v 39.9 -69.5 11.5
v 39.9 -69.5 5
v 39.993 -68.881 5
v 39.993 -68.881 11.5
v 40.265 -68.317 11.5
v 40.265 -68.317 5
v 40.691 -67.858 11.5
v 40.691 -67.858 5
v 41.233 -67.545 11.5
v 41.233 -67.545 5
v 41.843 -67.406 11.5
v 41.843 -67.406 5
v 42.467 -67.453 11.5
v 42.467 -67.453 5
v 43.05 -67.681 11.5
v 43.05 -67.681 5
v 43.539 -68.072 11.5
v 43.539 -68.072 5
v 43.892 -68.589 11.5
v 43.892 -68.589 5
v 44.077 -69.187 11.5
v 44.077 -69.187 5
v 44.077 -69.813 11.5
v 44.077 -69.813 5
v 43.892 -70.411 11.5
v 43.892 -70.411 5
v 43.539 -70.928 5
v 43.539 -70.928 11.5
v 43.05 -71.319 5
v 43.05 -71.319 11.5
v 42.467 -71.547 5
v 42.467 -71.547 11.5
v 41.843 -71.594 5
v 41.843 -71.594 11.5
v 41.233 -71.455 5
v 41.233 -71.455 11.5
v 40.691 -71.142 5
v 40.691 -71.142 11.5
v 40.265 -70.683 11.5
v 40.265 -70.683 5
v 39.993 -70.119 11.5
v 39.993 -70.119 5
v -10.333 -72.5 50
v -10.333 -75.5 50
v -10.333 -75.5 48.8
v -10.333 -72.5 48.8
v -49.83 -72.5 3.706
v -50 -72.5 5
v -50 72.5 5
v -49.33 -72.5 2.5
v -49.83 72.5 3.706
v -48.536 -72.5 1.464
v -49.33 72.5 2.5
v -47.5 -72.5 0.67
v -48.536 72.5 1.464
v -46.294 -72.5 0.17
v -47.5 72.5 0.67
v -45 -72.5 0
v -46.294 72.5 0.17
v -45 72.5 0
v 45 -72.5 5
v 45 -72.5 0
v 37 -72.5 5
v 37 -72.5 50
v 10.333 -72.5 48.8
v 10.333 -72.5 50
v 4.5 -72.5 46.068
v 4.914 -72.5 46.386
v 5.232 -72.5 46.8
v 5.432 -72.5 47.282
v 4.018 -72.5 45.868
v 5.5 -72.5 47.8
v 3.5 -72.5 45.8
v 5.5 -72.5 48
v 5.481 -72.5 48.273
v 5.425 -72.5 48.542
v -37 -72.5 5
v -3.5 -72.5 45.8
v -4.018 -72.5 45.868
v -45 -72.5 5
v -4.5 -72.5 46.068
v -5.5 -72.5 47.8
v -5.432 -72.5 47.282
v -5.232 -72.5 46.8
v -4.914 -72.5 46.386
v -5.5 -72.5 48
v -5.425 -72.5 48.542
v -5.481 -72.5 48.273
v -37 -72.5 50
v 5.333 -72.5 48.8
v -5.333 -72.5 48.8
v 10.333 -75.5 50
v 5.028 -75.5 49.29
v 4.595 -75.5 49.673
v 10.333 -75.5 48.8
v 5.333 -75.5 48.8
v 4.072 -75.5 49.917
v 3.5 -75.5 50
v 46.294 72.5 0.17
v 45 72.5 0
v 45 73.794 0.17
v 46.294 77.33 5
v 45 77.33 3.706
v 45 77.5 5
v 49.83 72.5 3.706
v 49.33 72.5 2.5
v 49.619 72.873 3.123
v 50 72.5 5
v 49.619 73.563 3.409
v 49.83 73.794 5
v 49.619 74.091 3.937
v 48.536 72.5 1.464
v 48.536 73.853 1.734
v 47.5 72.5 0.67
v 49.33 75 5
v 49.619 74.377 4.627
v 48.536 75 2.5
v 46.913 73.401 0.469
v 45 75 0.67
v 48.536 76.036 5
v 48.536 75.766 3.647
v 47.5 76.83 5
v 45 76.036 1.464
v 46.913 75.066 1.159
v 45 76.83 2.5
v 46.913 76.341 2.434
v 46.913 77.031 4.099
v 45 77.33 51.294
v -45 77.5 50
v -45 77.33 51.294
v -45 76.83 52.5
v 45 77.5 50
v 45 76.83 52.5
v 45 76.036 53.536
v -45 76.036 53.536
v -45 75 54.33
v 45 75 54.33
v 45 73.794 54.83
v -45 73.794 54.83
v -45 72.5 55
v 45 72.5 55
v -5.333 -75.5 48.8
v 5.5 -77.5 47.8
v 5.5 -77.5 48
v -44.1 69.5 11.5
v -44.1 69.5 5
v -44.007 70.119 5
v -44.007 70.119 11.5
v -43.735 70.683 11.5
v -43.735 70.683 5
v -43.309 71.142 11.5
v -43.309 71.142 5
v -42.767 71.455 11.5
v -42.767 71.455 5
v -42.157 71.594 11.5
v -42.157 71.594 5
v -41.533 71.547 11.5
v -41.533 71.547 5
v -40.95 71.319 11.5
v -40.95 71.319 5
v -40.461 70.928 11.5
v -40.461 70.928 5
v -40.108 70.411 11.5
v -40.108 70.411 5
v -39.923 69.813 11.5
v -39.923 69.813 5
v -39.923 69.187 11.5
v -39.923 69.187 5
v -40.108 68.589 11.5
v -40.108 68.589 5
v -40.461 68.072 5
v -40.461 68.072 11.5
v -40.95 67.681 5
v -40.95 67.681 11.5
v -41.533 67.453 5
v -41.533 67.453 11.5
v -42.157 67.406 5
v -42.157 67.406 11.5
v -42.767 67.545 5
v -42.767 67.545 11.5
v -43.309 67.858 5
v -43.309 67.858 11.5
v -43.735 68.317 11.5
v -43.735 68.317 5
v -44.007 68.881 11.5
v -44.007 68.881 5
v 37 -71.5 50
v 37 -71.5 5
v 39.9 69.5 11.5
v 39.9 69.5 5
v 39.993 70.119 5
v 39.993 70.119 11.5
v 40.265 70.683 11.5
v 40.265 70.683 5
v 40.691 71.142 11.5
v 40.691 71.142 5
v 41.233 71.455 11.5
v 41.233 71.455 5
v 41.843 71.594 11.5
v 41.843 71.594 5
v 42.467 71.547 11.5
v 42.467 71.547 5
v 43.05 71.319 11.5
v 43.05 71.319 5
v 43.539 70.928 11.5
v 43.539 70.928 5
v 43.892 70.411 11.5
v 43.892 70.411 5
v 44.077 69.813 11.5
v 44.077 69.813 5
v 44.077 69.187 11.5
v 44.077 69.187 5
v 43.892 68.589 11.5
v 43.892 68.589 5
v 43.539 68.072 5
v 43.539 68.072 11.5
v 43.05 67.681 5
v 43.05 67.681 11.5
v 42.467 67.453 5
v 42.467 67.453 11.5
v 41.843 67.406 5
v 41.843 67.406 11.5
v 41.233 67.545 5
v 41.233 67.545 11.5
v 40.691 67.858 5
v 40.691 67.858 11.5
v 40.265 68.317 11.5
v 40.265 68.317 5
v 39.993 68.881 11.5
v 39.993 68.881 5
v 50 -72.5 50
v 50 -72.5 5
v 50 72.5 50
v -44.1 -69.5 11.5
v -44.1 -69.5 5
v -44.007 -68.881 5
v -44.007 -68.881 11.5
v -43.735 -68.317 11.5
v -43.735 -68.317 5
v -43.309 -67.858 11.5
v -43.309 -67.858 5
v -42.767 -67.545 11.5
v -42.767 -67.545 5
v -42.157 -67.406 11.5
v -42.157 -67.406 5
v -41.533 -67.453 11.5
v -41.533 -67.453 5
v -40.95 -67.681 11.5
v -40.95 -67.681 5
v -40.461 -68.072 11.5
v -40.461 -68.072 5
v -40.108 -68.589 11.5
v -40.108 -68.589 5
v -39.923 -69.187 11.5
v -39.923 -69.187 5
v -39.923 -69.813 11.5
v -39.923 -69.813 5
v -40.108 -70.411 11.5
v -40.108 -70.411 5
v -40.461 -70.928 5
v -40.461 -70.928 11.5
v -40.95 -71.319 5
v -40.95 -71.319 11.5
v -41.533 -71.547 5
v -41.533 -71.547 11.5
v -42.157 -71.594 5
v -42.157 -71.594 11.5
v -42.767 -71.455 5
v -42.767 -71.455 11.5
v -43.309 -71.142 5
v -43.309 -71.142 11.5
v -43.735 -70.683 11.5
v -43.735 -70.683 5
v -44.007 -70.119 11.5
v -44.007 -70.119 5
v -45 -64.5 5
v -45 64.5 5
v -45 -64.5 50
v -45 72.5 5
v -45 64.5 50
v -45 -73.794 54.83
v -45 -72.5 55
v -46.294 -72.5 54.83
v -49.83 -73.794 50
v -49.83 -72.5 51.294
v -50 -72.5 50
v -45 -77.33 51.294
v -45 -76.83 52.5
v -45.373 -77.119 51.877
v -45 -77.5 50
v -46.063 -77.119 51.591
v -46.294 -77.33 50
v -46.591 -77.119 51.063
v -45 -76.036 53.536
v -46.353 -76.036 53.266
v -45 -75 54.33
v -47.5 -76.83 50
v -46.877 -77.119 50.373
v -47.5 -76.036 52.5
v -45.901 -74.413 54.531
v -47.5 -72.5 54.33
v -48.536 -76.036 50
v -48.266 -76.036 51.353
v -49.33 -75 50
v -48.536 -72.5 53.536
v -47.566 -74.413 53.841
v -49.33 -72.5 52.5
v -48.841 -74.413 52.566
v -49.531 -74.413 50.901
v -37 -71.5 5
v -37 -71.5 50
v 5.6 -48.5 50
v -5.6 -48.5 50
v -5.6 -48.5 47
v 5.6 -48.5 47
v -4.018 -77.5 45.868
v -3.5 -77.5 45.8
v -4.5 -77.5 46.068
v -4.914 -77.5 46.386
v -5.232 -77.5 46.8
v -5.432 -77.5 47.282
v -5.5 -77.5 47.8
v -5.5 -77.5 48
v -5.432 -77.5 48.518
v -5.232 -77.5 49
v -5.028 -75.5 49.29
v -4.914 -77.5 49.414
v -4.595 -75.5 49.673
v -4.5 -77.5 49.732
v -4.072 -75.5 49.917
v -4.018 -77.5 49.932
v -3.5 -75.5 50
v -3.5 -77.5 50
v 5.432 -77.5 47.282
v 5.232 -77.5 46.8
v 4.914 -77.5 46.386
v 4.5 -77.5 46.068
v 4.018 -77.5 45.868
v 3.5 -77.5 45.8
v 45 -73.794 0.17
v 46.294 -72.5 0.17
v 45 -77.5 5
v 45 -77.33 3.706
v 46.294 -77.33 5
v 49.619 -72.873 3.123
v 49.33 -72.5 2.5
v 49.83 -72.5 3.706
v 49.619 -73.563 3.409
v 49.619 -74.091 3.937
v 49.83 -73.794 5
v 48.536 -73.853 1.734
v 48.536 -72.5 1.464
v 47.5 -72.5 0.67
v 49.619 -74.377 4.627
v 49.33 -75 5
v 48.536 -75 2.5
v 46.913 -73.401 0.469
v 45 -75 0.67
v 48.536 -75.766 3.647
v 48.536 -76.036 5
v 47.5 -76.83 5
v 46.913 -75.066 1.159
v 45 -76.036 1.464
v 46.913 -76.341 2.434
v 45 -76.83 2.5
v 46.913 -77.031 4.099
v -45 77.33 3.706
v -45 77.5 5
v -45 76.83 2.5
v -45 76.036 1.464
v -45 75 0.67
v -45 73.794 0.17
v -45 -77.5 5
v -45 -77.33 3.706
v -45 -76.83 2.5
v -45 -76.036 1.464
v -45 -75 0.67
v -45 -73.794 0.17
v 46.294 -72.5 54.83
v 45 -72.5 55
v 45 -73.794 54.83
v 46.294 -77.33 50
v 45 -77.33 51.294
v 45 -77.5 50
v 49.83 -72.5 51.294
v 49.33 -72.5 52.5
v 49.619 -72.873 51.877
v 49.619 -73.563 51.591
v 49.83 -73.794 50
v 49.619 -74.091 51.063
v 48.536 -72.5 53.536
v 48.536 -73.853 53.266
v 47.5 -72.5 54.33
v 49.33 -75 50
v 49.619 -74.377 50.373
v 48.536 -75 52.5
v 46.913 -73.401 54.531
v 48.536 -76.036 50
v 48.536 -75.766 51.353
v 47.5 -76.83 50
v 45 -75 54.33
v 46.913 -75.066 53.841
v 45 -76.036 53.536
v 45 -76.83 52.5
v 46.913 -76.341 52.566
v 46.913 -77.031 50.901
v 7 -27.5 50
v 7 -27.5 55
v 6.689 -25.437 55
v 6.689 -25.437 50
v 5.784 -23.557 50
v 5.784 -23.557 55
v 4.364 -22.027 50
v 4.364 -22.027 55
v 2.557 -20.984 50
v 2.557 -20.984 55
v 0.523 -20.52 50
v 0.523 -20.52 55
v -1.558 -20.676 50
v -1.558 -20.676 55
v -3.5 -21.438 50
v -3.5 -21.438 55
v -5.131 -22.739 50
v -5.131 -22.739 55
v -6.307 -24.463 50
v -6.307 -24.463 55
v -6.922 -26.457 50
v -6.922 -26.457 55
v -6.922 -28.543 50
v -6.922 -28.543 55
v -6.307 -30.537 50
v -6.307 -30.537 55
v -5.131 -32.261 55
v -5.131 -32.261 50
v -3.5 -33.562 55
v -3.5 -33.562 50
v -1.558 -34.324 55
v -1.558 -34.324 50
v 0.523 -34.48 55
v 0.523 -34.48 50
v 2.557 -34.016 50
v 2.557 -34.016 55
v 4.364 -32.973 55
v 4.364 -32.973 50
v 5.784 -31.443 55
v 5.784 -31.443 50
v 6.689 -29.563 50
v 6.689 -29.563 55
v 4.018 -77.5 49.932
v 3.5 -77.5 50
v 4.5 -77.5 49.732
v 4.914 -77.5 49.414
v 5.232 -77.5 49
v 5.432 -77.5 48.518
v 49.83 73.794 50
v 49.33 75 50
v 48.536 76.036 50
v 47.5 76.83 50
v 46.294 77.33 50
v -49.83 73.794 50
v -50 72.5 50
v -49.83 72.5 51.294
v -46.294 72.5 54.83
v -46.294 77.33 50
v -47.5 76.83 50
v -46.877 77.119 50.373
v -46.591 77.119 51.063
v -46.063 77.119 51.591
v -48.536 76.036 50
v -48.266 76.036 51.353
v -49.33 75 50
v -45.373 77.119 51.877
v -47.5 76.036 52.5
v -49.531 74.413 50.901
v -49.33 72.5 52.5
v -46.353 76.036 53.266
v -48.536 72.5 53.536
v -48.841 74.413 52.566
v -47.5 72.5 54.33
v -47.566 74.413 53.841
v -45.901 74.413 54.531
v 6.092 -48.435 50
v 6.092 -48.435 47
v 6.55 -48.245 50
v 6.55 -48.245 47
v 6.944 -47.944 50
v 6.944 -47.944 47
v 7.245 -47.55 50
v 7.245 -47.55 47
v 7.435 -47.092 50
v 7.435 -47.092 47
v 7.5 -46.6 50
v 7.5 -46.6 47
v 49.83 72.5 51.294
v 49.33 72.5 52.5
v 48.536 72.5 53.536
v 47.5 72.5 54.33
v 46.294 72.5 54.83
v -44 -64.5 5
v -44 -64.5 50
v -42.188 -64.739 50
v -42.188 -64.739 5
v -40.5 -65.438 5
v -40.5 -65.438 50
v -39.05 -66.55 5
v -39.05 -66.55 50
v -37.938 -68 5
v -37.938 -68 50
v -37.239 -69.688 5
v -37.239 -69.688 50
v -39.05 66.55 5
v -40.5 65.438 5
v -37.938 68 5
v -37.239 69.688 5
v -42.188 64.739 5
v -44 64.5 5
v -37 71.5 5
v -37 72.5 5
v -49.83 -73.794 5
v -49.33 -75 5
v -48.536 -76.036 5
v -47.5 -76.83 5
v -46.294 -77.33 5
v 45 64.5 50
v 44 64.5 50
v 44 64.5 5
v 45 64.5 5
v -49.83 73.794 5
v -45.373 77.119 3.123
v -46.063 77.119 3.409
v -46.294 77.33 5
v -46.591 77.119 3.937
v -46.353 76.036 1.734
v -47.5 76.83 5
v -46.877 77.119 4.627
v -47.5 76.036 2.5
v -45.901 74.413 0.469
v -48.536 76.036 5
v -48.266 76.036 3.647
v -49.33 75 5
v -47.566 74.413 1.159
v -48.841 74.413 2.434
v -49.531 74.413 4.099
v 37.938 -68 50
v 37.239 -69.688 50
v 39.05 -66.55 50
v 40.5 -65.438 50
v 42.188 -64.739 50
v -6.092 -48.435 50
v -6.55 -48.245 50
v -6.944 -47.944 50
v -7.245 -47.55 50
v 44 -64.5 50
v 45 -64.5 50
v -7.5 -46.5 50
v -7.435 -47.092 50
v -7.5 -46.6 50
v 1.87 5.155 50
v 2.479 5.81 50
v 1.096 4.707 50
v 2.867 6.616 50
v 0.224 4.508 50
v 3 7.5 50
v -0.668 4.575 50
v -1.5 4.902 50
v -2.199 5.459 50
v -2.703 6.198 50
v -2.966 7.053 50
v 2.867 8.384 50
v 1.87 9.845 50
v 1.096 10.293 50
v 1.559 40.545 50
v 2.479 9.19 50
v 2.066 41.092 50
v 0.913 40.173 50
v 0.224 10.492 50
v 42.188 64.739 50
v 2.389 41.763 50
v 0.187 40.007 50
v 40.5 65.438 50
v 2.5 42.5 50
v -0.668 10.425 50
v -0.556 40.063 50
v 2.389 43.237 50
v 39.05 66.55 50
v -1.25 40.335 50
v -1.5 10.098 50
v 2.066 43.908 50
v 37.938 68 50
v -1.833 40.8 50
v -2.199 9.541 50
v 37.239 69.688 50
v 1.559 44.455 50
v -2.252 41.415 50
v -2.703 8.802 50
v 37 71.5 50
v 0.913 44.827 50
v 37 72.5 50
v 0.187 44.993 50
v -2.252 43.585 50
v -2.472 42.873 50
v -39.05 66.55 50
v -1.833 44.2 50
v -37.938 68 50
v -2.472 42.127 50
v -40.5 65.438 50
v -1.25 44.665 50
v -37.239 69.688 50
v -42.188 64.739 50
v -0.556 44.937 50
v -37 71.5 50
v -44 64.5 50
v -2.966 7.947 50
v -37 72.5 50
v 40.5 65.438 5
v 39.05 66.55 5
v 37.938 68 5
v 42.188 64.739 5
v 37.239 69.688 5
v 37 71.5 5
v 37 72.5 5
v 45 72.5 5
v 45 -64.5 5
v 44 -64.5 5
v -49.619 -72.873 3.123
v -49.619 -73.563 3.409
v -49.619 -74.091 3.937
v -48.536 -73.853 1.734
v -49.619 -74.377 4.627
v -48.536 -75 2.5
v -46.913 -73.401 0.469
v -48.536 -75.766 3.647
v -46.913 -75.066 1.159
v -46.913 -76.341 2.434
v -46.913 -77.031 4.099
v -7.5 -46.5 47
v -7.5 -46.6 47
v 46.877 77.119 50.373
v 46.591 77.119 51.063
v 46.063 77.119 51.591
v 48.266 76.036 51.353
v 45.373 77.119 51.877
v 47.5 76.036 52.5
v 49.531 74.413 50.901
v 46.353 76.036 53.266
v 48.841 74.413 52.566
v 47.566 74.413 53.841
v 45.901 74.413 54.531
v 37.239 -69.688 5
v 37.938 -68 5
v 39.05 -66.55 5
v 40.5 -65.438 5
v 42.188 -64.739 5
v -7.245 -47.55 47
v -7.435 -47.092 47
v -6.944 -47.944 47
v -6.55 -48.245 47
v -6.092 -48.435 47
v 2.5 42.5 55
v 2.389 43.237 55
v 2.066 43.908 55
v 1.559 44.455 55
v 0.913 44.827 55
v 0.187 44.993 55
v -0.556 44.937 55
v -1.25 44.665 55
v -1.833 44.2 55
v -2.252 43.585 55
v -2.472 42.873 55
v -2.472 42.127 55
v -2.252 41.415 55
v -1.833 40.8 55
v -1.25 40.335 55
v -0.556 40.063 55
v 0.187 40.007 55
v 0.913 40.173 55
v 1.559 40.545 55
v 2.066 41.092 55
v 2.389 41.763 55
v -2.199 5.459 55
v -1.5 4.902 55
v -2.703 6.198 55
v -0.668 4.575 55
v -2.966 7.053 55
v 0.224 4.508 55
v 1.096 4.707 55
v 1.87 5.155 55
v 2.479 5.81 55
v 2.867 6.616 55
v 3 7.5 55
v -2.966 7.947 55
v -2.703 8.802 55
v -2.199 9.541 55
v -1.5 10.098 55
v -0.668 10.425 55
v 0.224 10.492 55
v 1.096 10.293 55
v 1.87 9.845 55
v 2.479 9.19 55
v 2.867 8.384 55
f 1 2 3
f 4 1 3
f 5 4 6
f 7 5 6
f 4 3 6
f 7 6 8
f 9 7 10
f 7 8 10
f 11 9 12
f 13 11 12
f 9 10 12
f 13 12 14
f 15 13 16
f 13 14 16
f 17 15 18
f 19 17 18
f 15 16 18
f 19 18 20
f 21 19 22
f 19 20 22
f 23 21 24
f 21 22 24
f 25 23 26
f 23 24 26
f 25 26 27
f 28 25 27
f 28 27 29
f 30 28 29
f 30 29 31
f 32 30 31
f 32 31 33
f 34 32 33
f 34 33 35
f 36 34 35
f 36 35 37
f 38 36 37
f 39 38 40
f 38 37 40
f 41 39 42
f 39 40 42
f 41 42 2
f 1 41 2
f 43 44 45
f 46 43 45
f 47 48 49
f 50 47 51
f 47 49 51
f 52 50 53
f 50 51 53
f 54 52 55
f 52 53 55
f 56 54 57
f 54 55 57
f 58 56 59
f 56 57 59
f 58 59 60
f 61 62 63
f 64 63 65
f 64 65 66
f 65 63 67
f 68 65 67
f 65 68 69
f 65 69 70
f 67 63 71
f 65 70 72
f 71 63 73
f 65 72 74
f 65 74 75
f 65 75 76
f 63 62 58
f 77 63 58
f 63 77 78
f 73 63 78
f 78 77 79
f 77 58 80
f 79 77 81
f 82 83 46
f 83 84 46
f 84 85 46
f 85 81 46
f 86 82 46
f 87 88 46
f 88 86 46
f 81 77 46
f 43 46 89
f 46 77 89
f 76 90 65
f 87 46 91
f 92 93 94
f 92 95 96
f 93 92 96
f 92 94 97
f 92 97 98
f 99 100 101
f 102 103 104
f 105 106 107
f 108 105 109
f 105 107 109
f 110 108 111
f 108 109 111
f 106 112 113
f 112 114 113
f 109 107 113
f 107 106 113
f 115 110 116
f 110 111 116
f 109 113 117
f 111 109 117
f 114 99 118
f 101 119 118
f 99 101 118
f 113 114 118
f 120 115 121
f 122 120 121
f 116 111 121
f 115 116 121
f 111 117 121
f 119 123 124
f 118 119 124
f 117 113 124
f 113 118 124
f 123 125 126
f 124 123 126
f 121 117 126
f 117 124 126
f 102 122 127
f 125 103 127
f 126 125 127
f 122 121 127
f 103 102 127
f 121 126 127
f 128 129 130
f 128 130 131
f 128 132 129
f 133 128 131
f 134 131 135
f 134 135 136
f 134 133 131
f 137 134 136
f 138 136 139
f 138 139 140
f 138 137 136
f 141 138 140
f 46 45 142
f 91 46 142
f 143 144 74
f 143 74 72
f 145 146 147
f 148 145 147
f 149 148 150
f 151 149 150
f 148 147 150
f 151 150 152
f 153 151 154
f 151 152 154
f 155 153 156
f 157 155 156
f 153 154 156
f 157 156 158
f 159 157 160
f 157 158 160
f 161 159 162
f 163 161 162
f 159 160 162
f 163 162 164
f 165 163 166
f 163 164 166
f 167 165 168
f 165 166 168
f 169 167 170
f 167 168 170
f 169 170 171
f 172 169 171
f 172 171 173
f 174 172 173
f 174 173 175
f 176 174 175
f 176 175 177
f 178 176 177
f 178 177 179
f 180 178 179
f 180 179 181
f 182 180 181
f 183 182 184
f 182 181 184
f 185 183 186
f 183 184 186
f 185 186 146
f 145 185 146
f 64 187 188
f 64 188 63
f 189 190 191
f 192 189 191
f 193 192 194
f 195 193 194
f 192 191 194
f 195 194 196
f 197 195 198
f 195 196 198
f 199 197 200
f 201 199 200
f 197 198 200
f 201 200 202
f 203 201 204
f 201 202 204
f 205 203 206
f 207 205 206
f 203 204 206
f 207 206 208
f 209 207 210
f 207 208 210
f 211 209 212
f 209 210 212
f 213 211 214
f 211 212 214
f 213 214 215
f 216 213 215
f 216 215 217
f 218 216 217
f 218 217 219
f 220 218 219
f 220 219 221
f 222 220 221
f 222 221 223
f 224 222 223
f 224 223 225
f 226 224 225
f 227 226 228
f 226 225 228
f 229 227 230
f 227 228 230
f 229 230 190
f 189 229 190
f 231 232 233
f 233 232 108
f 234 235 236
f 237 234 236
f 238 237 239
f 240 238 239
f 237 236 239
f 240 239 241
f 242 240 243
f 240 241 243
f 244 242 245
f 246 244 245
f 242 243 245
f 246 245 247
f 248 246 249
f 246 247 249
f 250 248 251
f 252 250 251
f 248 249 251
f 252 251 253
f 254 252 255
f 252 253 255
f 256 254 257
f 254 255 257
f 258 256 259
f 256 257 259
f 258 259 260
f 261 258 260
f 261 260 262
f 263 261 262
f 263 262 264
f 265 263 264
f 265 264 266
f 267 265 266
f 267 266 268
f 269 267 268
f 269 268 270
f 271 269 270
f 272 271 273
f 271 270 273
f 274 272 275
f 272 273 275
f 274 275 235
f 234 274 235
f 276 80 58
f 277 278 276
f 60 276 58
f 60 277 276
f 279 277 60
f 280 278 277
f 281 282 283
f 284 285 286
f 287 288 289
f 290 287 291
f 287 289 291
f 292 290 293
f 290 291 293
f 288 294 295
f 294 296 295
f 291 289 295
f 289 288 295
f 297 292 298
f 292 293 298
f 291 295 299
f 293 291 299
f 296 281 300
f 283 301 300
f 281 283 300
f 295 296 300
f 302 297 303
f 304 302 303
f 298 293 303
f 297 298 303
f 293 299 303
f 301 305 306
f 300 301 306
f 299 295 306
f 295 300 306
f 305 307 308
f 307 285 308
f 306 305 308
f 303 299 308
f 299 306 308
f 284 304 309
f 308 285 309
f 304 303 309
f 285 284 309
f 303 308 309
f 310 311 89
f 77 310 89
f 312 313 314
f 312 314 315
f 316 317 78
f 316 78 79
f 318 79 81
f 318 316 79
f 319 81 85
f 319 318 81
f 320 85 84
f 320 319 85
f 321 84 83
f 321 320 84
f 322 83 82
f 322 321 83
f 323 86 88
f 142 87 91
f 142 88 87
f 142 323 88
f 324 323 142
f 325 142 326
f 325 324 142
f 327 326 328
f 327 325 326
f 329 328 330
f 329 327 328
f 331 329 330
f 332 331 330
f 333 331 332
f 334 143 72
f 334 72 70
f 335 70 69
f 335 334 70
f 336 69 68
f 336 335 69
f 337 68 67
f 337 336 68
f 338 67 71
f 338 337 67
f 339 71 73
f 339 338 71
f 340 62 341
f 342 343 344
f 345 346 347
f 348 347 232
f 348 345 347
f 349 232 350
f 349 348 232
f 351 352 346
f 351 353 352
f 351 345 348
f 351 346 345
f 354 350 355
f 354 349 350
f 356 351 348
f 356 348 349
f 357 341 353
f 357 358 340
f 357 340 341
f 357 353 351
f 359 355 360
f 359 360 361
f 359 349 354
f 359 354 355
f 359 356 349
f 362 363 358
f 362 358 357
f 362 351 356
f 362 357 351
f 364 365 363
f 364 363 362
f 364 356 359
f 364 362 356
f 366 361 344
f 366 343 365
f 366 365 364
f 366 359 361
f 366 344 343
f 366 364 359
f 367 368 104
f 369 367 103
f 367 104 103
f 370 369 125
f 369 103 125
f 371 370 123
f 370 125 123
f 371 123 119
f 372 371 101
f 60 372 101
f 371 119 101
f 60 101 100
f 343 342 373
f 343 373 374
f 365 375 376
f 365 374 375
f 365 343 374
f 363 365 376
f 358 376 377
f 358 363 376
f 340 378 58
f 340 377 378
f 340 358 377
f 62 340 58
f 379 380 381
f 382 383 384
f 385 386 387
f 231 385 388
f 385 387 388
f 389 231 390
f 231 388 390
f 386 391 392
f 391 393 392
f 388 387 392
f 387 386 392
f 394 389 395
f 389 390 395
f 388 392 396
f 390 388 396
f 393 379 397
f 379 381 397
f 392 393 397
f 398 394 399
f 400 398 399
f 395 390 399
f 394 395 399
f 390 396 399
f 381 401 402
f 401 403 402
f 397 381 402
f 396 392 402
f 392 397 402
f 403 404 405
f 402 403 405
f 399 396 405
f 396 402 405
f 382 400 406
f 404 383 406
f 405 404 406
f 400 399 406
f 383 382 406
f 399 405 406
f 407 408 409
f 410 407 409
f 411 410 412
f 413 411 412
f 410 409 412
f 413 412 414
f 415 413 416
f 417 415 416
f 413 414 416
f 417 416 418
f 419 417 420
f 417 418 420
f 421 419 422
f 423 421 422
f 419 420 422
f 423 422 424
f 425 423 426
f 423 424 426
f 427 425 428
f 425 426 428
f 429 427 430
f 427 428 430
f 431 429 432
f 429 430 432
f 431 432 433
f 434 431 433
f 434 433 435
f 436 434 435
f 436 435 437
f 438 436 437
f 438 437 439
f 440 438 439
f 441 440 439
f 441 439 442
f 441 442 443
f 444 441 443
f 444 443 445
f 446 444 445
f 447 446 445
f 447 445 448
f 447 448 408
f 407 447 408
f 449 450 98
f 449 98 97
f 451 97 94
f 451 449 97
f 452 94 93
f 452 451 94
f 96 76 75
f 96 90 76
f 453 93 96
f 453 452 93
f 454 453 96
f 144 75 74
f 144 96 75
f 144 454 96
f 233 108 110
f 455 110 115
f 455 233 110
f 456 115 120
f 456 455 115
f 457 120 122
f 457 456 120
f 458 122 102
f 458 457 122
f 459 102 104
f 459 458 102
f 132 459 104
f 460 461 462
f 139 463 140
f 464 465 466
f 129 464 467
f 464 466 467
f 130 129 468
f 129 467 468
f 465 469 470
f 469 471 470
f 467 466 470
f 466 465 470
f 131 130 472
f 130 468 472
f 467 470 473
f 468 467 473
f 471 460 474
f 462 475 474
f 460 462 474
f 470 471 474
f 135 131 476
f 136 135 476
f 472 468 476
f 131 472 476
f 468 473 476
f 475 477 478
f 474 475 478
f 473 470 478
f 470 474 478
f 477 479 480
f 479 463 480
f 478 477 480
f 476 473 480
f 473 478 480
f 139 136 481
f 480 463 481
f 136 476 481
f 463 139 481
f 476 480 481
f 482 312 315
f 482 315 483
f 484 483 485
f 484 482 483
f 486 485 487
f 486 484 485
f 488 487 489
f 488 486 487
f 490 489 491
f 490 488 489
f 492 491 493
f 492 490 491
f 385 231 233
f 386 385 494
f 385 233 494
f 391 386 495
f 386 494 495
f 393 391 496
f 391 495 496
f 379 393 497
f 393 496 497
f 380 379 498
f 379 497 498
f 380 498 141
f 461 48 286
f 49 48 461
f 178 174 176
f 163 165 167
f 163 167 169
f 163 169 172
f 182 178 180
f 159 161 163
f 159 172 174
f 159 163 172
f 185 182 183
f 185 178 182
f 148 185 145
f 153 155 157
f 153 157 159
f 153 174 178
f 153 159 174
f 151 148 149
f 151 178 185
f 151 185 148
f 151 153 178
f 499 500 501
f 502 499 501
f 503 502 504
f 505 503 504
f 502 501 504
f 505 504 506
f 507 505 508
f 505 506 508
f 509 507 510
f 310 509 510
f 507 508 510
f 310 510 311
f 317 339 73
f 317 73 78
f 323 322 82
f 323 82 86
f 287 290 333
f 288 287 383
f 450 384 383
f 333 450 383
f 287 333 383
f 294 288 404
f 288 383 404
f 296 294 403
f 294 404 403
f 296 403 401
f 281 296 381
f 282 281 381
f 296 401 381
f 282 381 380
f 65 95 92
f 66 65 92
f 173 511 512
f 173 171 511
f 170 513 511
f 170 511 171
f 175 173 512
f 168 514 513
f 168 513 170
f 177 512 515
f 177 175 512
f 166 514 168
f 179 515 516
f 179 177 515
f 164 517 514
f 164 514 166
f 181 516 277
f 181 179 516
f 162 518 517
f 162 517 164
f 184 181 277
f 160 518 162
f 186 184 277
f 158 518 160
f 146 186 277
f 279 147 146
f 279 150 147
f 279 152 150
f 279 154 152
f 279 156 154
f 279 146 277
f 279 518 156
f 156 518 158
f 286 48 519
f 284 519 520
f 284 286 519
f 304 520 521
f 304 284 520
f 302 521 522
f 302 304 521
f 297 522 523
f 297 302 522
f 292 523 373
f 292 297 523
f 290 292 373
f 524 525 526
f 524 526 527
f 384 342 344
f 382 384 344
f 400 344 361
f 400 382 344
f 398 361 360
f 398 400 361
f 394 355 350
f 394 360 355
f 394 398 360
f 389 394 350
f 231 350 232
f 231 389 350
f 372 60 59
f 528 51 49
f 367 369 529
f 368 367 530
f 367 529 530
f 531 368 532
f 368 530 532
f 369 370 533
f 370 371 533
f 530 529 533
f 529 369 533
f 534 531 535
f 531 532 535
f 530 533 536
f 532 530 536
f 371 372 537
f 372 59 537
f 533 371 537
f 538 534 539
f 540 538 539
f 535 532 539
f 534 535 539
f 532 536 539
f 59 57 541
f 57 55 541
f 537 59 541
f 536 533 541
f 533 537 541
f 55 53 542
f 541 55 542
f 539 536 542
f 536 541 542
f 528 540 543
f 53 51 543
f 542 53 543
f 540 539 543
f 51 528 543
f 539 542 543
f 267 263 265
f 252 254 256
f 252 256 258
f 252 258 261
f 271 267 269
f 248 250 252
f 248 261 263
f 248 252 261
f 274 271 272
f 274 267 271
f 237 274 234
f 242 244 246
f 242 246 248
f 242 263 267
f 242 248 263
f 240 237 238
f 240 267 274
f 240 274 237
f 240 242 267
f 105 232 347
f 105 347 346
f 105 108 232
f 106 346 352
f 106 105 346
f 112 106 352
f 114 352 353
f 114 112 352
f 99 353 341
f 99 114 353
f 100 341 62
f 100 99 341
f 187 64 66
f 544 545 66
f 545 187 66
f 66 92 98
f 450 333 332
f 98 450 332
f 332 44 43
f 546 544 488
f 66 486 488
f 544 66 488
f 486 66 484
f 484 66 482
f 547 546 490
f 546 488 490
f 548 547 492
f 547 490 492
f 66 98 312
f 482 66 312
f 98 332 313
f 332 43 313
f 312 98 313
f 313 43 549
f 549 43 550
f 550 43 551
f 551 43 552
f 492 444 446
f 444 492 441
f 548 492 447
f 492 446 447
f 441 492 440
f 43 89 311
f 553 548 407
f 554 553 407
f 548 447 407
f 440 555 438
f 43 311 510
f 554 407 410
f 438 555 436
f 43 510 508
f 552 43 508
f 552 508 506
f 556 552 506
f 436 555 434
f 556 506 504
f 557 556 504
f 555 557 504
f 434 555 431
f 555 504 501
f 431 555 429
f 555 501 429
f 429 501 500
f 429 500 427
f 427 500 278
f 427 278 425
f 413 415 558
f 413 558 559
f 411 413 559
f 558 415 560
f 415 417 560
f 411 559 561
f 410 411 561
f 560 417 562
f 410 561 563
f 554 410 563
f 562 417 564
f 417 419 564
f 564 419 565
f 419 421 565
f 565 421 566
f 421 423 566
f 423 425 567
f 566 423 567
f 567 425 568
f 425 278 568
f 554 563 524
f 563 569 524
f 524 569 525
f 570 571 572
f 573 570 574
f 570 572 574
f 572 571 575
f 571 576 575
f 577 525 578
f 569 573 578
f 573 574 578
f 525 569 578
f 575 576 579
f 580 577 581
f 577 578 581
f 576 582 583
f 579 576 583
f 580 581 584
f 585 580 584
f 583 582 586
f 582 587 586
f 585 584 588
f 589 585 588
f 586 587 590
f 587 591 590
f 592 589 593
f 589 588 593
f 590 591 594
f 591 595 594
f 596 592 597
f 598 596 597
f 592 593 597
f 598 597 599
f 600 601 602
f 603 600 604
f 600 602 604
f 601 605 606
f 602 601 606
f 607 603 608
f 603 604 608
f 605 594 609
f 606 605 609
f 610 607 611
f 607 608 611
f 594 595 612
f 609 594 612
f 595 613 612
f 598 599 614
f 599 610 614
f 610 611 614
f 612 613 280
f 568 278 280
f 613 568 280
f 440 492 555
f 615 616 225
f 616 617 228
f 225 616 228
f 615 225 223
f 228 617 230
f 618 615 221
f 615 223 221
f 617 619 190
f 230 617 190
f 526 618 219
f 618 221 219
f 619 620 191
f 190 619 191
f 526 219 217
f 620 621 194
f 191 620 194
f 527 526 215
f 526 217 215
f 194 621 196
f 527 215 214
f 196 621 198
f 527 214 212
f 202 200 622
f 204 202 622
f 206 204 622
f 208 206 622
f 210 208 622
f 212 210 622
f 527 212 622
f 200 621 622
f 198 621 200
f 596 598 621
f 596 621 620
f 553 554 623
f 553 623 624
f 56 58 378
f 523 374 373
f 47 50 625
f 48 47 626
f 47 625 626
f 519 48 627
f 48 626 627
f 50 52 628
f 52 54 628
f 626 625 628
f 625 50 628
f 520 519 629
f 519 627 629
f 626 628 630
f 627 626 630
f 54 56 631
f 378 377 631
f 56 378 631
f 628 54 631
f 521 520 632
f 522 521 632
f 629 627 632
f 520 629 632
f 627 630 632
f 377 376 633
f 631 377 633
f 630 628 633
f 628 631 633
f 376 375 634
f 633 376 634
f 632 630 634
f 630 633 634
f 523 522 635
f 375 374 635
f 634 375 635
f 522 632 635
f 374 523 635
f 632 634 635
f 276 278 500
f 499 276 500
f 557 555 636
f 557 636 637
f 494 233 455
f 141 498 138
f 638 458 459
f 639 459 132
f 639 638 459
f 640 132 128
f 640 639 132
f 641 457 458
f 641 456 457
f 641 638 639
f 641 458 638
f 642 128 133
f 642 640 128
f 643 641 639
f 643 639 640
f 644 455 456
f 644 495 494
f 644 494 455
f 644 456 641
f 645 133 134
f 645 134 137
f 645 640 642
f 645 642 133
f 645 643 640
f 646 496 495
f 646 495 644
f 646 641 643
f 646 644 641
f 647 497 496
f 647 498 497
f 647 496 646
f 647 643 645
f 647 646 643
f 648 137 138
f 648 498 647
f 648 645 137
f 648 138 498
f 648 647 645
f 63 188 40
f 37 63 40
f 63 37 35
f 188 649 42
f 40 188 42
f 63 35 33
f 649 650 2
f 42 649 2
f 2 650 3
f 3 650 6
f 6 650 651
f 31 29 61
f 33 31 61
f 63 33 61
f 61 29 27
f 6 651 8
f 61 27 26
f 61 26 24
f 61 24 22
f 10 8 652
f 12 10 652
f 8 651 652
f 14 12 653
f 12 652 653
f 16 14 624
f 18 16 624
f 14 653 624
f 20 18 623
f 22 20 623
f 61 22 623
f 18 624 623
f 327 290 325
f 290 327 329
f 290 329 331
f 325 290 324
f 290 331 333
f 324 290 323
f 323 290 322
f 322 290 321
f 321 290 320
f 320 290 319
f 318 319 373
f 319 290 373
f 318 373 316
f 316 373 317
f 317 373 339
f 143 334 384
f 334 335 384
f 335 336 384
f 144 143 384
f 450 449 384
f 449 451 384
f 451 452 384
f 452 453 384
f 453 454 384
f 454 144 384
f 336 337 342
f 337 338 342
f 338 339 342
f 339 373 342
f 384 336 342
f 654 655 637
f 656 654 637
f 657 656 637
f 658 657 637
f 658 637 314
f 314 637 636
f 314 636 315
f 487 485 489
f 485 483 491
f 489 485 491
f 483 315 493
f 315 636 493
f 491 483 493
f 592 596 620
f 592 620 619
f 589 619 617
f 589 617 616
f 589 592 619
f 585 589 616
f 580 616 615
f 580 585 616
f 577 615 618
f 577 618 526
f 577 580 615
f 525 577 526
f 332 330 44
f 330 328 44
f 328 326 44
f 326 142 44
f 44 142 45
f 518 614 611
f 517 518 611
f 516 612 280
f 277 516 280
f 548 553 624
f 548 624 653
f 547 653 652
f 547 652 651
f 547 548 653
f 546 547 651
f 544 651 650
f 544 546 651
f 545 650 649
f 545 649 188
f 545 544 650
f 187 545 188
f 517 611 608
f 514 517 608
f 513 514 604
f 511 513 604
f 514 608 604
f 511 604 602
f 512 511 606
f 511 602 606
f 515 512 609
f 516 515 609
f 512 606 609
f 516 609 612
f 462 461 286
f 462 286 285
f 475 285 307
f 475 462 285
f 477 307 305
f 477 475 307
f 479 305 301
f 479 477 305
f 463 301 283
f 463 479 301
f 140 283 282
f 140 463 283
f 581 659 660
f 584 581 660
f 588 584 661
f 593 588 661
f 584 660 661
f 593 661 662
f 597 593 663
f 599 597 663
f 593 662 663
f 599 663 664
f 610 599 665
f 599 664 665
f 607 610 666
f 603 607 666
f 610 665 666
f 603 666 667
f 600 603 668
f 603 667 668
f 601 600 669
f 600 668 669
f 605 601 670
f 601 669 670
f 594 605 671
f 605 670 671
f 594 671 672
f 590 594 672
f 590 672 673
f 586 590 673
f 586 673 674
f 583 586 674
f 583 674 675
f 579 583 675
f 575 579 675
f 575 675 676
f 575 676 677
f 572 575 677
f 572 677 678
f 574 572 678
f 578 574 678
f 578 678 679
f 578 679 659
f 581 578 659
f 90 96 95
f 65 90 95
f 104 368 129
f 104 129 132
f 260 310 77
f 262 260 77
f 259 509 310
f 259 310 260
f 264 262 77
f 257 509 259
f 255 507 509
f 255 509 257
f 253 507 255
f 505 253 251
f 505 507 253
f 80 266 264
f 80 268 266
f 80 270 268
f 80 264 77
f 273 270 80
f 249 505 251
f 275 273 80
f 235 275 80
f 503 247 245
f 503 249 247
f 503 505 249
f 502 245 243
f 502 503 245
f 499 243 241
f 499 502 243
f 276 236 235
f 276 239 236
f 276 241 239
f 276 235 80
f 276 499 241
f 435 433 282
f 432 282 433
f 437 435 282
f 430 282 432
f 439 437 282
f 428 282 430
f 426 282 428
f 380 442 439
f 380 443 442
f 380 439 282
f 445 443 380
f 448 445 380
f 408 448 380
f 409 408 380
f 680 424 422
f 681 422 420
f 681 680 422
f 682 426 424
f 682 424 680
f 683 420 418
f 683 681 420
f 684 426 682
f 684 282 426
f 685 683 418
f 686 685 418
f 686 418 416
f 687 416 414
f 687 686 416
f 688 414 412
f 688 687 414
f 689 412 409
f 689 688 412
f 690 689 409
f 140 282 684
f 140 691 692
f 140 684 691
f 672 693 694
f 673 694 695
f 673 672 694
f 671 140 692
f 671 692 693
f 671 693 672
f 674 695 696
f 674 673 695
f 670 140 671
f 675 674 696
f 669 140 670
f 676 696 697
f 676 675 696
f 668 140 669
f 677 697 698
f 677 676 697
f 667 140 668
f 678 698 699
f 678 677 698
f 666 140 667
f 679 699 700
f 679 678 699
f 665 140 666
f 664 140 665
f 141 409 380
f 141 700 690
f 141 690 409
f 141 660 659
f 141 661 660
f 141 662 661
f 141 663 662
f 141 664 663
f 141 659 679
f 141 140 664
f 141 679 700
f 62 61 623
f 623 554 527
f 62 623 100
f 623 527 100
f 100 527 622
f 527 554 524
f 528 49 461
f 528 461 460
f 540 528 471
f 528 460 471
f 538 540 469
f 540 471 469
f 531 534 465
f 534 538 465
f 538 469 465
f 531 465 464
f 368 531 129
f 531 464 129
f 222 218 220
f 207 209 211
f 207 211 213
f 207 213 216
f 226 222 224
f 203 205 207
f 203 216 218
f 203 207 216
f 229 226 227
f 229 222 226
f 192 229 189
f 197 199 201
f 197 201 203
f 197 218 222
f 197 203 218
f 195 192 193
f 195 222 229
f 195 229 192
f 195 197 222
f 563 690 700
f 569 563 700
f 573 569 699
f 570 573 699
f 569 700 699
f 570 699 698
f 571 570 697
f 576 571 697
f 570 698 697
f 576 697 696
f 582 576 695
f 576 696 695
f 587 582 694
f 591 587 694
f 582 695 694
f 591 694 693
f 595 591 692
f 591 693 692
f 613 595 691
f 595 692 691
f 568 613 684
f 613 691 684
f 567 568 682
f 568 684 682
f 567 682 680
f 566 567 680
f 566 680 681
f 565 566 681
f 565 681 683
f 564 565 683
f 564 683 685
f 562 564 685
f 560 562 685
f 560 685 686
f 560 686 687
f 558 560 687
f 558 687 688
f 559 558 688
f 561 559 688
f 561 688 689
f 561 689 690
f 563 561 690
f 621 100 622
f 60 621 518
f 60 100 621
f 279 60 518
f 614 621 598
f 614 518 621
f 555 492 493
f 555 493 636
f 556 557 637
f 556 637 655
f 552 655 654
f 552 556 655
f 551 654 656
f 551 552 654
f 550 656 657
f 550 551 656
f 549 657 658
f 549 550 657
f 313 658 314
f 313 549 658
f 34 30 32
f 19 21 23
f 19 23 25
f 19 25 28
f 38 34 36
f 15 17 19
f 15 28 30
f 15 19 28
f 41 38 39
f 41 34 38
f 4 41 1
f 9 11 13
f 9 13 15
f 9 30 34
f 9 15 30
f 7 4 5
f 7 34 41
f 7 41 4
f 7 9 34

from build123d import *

# Parameters (mm, degrees)
SKETCH6_W           = 100
SKETCH6_H           = 155
BOSS_EXTRUDE5_DEPTH = 55
FILLET2_R           = 5
SHELL3_START        = -45
SHELL3_OUTLINE_W    = 145
SHELL3_OUTLINE_H    = 50
SHELL3_DEPTH        = 90
BOSS_EXTRUDE6_DEPTH = 45
SKETCH8_R           = 2.1
CUT_EXTRUDE1_DEPTH  = 6.5
SKETCH9_R           = 2.5
SKETCH9_R_2         = 3
SKETCH9_R_3         = 7
CUT_EXTRUDE2_DEPTH  = 108.383657975
CUT_EXTRUDE3_REACH  = 173.901
CUT_EXTRUDE4_START  = -3
CUT_EXTRUDE4_DEPTH  = 3
BOSS_EXTRUDE7_DEPTH = 3


# Read off the part's stored shape, not the designer's step: Shell3
with BuildPart() as part:
    # Sketch6 → Boss-Extrude5 (new body)
    with BuildSketch(Plane.XY):
        Rectangle(SKETCH6_W, SKETCH6_H)
    extrude(amount=BOSS_EXTRUDE5_DEPTH)

    # Fillet2
    fillet2_edges = [part.edges().sort_by_distance(p)[0] for p in [
        (-50, 0, 55),
        (0, -77.5, 55),
        (50, 0, 55),
        (0, -77.5, 0),
        (-50, 0, 0),
        (0, 77.5, 0),
        (50, 0, 0),
        (50, -77.5, 27.5),
        (-50, -77.5, 27.5),
        (-50, 77.5, 27.5),
        (50, 77.5, 27.5),
        (0, 77.5, 55),
    ]]
    fillet(fillet2_edges, radius=FILLET2_R)

    # Shell3 outline → Shell3 (cut)
    with BuildSketch(Plane.YZ.offset(SHELL3_START)):
        with Locations((0, 25)):
            Rectangle(SHELL3_OUTLINE_W, SHELL3_OUTLINE_H)
    extrude(amount=SHELL3_DEPTH, mode=Mode.SUBTRACT)

    # Sketch7 → Boss-Extrude6 (add)
    with BuildSketch(Plane(origin=(0, 0, 50), x_dir=(-1, 0, 0), z_dir=(0, 0, -1))):
        with BuildLine():
            Line((-45, 72.5), (-37, 72.5))
            Line((-37, 72.5), (-37, 71.5))
            ThreePointArc((-37, 71.5), (-39.050252532, 66.550252532), (-44, 64.5))
            Line((-44, 64.5), (-45, 64.5))
            Line((-45, 64.5), (-45, 72.5))
        make_face()
        with BuildLine():
            Line((45, 72.5), (37, 72.5))
            Line((37, 72.5), (37, 71.5))
            ThreePointArc((37, 71.5), (39.050252532, 66.550252532), (44, 64.5))
            Line((44, 64.5), (45, 64.5))
            Line((45, 64.5), (45, 72.5))
        make_face()
        with BuildLine():
            Line((-45, -64.5), (-44, -64.5))
            ThreePointArc((-44, -64.5), (-39.050252532, -66.550252532), (-37, -71.5))
            Line((-37, -71.5), (-37, -72.5))
            Line((-37, -72.5), (-45, -72.5))
            Line((-45, -72.5), (-45, -64.5))
        make_face()
        with BuildLine():
            Line((45, -72.5), (45, -64.5))
            Line((45, -64.5), (44, -64.5))
            ThreePointArc((44, -64.5), (39.050252532, -66.550252532), (37, -71.5))
            Line((37, -71.5), (37, -72.5))
            Line((37, -72.5), (45, -72.5))
        make_face()
    extrude(amount=BOSS_EXTRUDE6_DEPTH)

    # Sketch8 → Cut-Extrude1 (cut)
    with BuildSketch(Plane(origin=(0, 0, 5), x_dir=(-1, 0, 0), z_dir=(0, 0, -1))):
        with Locations((-42, 69.5)):
            Circle(SKETCH8_R)
        with Locations((42, 69.5)):
            Circle(SKETCH8_R)
        with Locations((42, -69.5)):
            Circle(SKETCH8_R)
        with Locations((-42, -69.5)):
            Circle(SKETCH8_R)
    extrude(amount=-CUT_EXTRUDE1_DEPTH, mode=Mode.SUBTRACT)

    # Sketch9 → Cut-Extrude2 (cut, through all)
    with BuildSketch(Plane.XY.offset(55)):
        with Locations((0, 42.5)):
            Circle(SKETCH9_R)
        with Locations((0, 7.5)):
            Circle(SKETCH9_R_2)
        with Locations((0, -27.5)):
            Circle(SKETCH9_R_3)
    extrude(amount=-CUT_EXTRUDE2_DEPTH, mode=Mode.SUBTRACT)

    # Sketch10 → Cut-Extrude3 (cut, up to next)
    with BuildSketch(Plane.XZ.offset(77.5), mode=Mode.PRIVATE) as cut_extrude3_sk1:
        with BuildLine():
            Line((-3.5, 50), (3.5, 50))
            ThreePointArc((3.5, 50), (4.914213562, 49.414213562), (5.5, 48))
            Line((5.5, 48), (5.5, 47.8))
            ThreePointArc((5.5, 47.8), (4.914213562, 46.385786438), (3.5, 45.8))
            Line((3.5, 45.8), (-3.5, 45.8))
            ThreePointArc((-3.5, 45.8), (-4.914213562, 46.385786438), (-5.5, 47.8))
            Line((-5.5, 47.8), (-5.5, 48))
            ThreePointArc((-5.5, 48), (-4.914213562, 49.414213562), (-3.5, 50))
        make_face()
    cut_extrude3_tool1 = extrude(cut_extrude3_sk1.sketch, amount=-CUT_EXTRUDE3_REACH, mode=Mode.PRIVATE) & part.part
    add(cut_extrude3_tool1.solids().sort_by_distance((0, -77.5, 47.9))[0], mode=Mode.SUBTRACT)

    # Sketch13 → Cut-Extrude4 (cut)
    with BuildSketch(Plane(origin=(0, -72.5, 0), x_dir=(1, 0, 0), z_dir=(0, 1, 0)).offset(CUT_EXTRUDE4_START)):
        with BuildLine():
            Line((5.5, -47.8), (5.5, -48))
            ThreePointArc((5.5, -48), (5.457812626, -48.408619287), (5.333030278, -48.8))
            Line((5.333030278, -48.8), (10.333030278, -48.8))
            Line((10.333030278, -48.8), (10.333030278, -50))
            Line((10.333030278, -50), (3.5, -50))
            Line((3.5, -50), (-3.5, -50))
            Line((-3.5, -50), (-10.333030278, -50))
            Line((-10.333030278, -50), (-10.333030278, -48.8))
            Line((-10.333030278, -48.8), (-5.333030278, -48.8))
            ThreePointArc((-5.333030278, -48.8), (-5.457812626, -48.408619287), (-5.5, -48))
            Line((-5.5, -48), (-5.5, -47.8))
            ThreePointArc((-5.5, -47.8), (-4.914213562, -46.385786438), (-3.5, -45.8))
            Line((-3.5, -45.8), (3.5, -45.8))
            ThreePointArc((3.5, -45.8), (4.914213562, -46.385786438), (5.5, -47.8))
        make_face()
    extrude(amount=CUT_EXTRUDE4_DEPTH, mode=Mode.SUBTRACT)

    # Sketch14 → Boss-Extrude7 (add)
    with BuildSketch(Plane(origin=(0, 0, 50), x_dir=(-1, 0, 0), z_dir=(0, 0, -1))):
        with BuildLine():
            Line((-7.5, -46.6), (7.5, -46.5))
            Line((7.5, -46.5), (7.5, -46.6))
            ThreePointArc((7.5, -46.6), (6.943502884, -47.943502884), (5.6, -48.5))
            Line((5.6, -48.5), (-5.6, -48.5))
            ThreePointArc((-5.6, -48.5), (-6.943502884, -47.943502884), (-7.5, -46.6))
        make_face()
    extrude(amount=BOSS_EXTRUDE7_DEPTH)


solid = part.part
